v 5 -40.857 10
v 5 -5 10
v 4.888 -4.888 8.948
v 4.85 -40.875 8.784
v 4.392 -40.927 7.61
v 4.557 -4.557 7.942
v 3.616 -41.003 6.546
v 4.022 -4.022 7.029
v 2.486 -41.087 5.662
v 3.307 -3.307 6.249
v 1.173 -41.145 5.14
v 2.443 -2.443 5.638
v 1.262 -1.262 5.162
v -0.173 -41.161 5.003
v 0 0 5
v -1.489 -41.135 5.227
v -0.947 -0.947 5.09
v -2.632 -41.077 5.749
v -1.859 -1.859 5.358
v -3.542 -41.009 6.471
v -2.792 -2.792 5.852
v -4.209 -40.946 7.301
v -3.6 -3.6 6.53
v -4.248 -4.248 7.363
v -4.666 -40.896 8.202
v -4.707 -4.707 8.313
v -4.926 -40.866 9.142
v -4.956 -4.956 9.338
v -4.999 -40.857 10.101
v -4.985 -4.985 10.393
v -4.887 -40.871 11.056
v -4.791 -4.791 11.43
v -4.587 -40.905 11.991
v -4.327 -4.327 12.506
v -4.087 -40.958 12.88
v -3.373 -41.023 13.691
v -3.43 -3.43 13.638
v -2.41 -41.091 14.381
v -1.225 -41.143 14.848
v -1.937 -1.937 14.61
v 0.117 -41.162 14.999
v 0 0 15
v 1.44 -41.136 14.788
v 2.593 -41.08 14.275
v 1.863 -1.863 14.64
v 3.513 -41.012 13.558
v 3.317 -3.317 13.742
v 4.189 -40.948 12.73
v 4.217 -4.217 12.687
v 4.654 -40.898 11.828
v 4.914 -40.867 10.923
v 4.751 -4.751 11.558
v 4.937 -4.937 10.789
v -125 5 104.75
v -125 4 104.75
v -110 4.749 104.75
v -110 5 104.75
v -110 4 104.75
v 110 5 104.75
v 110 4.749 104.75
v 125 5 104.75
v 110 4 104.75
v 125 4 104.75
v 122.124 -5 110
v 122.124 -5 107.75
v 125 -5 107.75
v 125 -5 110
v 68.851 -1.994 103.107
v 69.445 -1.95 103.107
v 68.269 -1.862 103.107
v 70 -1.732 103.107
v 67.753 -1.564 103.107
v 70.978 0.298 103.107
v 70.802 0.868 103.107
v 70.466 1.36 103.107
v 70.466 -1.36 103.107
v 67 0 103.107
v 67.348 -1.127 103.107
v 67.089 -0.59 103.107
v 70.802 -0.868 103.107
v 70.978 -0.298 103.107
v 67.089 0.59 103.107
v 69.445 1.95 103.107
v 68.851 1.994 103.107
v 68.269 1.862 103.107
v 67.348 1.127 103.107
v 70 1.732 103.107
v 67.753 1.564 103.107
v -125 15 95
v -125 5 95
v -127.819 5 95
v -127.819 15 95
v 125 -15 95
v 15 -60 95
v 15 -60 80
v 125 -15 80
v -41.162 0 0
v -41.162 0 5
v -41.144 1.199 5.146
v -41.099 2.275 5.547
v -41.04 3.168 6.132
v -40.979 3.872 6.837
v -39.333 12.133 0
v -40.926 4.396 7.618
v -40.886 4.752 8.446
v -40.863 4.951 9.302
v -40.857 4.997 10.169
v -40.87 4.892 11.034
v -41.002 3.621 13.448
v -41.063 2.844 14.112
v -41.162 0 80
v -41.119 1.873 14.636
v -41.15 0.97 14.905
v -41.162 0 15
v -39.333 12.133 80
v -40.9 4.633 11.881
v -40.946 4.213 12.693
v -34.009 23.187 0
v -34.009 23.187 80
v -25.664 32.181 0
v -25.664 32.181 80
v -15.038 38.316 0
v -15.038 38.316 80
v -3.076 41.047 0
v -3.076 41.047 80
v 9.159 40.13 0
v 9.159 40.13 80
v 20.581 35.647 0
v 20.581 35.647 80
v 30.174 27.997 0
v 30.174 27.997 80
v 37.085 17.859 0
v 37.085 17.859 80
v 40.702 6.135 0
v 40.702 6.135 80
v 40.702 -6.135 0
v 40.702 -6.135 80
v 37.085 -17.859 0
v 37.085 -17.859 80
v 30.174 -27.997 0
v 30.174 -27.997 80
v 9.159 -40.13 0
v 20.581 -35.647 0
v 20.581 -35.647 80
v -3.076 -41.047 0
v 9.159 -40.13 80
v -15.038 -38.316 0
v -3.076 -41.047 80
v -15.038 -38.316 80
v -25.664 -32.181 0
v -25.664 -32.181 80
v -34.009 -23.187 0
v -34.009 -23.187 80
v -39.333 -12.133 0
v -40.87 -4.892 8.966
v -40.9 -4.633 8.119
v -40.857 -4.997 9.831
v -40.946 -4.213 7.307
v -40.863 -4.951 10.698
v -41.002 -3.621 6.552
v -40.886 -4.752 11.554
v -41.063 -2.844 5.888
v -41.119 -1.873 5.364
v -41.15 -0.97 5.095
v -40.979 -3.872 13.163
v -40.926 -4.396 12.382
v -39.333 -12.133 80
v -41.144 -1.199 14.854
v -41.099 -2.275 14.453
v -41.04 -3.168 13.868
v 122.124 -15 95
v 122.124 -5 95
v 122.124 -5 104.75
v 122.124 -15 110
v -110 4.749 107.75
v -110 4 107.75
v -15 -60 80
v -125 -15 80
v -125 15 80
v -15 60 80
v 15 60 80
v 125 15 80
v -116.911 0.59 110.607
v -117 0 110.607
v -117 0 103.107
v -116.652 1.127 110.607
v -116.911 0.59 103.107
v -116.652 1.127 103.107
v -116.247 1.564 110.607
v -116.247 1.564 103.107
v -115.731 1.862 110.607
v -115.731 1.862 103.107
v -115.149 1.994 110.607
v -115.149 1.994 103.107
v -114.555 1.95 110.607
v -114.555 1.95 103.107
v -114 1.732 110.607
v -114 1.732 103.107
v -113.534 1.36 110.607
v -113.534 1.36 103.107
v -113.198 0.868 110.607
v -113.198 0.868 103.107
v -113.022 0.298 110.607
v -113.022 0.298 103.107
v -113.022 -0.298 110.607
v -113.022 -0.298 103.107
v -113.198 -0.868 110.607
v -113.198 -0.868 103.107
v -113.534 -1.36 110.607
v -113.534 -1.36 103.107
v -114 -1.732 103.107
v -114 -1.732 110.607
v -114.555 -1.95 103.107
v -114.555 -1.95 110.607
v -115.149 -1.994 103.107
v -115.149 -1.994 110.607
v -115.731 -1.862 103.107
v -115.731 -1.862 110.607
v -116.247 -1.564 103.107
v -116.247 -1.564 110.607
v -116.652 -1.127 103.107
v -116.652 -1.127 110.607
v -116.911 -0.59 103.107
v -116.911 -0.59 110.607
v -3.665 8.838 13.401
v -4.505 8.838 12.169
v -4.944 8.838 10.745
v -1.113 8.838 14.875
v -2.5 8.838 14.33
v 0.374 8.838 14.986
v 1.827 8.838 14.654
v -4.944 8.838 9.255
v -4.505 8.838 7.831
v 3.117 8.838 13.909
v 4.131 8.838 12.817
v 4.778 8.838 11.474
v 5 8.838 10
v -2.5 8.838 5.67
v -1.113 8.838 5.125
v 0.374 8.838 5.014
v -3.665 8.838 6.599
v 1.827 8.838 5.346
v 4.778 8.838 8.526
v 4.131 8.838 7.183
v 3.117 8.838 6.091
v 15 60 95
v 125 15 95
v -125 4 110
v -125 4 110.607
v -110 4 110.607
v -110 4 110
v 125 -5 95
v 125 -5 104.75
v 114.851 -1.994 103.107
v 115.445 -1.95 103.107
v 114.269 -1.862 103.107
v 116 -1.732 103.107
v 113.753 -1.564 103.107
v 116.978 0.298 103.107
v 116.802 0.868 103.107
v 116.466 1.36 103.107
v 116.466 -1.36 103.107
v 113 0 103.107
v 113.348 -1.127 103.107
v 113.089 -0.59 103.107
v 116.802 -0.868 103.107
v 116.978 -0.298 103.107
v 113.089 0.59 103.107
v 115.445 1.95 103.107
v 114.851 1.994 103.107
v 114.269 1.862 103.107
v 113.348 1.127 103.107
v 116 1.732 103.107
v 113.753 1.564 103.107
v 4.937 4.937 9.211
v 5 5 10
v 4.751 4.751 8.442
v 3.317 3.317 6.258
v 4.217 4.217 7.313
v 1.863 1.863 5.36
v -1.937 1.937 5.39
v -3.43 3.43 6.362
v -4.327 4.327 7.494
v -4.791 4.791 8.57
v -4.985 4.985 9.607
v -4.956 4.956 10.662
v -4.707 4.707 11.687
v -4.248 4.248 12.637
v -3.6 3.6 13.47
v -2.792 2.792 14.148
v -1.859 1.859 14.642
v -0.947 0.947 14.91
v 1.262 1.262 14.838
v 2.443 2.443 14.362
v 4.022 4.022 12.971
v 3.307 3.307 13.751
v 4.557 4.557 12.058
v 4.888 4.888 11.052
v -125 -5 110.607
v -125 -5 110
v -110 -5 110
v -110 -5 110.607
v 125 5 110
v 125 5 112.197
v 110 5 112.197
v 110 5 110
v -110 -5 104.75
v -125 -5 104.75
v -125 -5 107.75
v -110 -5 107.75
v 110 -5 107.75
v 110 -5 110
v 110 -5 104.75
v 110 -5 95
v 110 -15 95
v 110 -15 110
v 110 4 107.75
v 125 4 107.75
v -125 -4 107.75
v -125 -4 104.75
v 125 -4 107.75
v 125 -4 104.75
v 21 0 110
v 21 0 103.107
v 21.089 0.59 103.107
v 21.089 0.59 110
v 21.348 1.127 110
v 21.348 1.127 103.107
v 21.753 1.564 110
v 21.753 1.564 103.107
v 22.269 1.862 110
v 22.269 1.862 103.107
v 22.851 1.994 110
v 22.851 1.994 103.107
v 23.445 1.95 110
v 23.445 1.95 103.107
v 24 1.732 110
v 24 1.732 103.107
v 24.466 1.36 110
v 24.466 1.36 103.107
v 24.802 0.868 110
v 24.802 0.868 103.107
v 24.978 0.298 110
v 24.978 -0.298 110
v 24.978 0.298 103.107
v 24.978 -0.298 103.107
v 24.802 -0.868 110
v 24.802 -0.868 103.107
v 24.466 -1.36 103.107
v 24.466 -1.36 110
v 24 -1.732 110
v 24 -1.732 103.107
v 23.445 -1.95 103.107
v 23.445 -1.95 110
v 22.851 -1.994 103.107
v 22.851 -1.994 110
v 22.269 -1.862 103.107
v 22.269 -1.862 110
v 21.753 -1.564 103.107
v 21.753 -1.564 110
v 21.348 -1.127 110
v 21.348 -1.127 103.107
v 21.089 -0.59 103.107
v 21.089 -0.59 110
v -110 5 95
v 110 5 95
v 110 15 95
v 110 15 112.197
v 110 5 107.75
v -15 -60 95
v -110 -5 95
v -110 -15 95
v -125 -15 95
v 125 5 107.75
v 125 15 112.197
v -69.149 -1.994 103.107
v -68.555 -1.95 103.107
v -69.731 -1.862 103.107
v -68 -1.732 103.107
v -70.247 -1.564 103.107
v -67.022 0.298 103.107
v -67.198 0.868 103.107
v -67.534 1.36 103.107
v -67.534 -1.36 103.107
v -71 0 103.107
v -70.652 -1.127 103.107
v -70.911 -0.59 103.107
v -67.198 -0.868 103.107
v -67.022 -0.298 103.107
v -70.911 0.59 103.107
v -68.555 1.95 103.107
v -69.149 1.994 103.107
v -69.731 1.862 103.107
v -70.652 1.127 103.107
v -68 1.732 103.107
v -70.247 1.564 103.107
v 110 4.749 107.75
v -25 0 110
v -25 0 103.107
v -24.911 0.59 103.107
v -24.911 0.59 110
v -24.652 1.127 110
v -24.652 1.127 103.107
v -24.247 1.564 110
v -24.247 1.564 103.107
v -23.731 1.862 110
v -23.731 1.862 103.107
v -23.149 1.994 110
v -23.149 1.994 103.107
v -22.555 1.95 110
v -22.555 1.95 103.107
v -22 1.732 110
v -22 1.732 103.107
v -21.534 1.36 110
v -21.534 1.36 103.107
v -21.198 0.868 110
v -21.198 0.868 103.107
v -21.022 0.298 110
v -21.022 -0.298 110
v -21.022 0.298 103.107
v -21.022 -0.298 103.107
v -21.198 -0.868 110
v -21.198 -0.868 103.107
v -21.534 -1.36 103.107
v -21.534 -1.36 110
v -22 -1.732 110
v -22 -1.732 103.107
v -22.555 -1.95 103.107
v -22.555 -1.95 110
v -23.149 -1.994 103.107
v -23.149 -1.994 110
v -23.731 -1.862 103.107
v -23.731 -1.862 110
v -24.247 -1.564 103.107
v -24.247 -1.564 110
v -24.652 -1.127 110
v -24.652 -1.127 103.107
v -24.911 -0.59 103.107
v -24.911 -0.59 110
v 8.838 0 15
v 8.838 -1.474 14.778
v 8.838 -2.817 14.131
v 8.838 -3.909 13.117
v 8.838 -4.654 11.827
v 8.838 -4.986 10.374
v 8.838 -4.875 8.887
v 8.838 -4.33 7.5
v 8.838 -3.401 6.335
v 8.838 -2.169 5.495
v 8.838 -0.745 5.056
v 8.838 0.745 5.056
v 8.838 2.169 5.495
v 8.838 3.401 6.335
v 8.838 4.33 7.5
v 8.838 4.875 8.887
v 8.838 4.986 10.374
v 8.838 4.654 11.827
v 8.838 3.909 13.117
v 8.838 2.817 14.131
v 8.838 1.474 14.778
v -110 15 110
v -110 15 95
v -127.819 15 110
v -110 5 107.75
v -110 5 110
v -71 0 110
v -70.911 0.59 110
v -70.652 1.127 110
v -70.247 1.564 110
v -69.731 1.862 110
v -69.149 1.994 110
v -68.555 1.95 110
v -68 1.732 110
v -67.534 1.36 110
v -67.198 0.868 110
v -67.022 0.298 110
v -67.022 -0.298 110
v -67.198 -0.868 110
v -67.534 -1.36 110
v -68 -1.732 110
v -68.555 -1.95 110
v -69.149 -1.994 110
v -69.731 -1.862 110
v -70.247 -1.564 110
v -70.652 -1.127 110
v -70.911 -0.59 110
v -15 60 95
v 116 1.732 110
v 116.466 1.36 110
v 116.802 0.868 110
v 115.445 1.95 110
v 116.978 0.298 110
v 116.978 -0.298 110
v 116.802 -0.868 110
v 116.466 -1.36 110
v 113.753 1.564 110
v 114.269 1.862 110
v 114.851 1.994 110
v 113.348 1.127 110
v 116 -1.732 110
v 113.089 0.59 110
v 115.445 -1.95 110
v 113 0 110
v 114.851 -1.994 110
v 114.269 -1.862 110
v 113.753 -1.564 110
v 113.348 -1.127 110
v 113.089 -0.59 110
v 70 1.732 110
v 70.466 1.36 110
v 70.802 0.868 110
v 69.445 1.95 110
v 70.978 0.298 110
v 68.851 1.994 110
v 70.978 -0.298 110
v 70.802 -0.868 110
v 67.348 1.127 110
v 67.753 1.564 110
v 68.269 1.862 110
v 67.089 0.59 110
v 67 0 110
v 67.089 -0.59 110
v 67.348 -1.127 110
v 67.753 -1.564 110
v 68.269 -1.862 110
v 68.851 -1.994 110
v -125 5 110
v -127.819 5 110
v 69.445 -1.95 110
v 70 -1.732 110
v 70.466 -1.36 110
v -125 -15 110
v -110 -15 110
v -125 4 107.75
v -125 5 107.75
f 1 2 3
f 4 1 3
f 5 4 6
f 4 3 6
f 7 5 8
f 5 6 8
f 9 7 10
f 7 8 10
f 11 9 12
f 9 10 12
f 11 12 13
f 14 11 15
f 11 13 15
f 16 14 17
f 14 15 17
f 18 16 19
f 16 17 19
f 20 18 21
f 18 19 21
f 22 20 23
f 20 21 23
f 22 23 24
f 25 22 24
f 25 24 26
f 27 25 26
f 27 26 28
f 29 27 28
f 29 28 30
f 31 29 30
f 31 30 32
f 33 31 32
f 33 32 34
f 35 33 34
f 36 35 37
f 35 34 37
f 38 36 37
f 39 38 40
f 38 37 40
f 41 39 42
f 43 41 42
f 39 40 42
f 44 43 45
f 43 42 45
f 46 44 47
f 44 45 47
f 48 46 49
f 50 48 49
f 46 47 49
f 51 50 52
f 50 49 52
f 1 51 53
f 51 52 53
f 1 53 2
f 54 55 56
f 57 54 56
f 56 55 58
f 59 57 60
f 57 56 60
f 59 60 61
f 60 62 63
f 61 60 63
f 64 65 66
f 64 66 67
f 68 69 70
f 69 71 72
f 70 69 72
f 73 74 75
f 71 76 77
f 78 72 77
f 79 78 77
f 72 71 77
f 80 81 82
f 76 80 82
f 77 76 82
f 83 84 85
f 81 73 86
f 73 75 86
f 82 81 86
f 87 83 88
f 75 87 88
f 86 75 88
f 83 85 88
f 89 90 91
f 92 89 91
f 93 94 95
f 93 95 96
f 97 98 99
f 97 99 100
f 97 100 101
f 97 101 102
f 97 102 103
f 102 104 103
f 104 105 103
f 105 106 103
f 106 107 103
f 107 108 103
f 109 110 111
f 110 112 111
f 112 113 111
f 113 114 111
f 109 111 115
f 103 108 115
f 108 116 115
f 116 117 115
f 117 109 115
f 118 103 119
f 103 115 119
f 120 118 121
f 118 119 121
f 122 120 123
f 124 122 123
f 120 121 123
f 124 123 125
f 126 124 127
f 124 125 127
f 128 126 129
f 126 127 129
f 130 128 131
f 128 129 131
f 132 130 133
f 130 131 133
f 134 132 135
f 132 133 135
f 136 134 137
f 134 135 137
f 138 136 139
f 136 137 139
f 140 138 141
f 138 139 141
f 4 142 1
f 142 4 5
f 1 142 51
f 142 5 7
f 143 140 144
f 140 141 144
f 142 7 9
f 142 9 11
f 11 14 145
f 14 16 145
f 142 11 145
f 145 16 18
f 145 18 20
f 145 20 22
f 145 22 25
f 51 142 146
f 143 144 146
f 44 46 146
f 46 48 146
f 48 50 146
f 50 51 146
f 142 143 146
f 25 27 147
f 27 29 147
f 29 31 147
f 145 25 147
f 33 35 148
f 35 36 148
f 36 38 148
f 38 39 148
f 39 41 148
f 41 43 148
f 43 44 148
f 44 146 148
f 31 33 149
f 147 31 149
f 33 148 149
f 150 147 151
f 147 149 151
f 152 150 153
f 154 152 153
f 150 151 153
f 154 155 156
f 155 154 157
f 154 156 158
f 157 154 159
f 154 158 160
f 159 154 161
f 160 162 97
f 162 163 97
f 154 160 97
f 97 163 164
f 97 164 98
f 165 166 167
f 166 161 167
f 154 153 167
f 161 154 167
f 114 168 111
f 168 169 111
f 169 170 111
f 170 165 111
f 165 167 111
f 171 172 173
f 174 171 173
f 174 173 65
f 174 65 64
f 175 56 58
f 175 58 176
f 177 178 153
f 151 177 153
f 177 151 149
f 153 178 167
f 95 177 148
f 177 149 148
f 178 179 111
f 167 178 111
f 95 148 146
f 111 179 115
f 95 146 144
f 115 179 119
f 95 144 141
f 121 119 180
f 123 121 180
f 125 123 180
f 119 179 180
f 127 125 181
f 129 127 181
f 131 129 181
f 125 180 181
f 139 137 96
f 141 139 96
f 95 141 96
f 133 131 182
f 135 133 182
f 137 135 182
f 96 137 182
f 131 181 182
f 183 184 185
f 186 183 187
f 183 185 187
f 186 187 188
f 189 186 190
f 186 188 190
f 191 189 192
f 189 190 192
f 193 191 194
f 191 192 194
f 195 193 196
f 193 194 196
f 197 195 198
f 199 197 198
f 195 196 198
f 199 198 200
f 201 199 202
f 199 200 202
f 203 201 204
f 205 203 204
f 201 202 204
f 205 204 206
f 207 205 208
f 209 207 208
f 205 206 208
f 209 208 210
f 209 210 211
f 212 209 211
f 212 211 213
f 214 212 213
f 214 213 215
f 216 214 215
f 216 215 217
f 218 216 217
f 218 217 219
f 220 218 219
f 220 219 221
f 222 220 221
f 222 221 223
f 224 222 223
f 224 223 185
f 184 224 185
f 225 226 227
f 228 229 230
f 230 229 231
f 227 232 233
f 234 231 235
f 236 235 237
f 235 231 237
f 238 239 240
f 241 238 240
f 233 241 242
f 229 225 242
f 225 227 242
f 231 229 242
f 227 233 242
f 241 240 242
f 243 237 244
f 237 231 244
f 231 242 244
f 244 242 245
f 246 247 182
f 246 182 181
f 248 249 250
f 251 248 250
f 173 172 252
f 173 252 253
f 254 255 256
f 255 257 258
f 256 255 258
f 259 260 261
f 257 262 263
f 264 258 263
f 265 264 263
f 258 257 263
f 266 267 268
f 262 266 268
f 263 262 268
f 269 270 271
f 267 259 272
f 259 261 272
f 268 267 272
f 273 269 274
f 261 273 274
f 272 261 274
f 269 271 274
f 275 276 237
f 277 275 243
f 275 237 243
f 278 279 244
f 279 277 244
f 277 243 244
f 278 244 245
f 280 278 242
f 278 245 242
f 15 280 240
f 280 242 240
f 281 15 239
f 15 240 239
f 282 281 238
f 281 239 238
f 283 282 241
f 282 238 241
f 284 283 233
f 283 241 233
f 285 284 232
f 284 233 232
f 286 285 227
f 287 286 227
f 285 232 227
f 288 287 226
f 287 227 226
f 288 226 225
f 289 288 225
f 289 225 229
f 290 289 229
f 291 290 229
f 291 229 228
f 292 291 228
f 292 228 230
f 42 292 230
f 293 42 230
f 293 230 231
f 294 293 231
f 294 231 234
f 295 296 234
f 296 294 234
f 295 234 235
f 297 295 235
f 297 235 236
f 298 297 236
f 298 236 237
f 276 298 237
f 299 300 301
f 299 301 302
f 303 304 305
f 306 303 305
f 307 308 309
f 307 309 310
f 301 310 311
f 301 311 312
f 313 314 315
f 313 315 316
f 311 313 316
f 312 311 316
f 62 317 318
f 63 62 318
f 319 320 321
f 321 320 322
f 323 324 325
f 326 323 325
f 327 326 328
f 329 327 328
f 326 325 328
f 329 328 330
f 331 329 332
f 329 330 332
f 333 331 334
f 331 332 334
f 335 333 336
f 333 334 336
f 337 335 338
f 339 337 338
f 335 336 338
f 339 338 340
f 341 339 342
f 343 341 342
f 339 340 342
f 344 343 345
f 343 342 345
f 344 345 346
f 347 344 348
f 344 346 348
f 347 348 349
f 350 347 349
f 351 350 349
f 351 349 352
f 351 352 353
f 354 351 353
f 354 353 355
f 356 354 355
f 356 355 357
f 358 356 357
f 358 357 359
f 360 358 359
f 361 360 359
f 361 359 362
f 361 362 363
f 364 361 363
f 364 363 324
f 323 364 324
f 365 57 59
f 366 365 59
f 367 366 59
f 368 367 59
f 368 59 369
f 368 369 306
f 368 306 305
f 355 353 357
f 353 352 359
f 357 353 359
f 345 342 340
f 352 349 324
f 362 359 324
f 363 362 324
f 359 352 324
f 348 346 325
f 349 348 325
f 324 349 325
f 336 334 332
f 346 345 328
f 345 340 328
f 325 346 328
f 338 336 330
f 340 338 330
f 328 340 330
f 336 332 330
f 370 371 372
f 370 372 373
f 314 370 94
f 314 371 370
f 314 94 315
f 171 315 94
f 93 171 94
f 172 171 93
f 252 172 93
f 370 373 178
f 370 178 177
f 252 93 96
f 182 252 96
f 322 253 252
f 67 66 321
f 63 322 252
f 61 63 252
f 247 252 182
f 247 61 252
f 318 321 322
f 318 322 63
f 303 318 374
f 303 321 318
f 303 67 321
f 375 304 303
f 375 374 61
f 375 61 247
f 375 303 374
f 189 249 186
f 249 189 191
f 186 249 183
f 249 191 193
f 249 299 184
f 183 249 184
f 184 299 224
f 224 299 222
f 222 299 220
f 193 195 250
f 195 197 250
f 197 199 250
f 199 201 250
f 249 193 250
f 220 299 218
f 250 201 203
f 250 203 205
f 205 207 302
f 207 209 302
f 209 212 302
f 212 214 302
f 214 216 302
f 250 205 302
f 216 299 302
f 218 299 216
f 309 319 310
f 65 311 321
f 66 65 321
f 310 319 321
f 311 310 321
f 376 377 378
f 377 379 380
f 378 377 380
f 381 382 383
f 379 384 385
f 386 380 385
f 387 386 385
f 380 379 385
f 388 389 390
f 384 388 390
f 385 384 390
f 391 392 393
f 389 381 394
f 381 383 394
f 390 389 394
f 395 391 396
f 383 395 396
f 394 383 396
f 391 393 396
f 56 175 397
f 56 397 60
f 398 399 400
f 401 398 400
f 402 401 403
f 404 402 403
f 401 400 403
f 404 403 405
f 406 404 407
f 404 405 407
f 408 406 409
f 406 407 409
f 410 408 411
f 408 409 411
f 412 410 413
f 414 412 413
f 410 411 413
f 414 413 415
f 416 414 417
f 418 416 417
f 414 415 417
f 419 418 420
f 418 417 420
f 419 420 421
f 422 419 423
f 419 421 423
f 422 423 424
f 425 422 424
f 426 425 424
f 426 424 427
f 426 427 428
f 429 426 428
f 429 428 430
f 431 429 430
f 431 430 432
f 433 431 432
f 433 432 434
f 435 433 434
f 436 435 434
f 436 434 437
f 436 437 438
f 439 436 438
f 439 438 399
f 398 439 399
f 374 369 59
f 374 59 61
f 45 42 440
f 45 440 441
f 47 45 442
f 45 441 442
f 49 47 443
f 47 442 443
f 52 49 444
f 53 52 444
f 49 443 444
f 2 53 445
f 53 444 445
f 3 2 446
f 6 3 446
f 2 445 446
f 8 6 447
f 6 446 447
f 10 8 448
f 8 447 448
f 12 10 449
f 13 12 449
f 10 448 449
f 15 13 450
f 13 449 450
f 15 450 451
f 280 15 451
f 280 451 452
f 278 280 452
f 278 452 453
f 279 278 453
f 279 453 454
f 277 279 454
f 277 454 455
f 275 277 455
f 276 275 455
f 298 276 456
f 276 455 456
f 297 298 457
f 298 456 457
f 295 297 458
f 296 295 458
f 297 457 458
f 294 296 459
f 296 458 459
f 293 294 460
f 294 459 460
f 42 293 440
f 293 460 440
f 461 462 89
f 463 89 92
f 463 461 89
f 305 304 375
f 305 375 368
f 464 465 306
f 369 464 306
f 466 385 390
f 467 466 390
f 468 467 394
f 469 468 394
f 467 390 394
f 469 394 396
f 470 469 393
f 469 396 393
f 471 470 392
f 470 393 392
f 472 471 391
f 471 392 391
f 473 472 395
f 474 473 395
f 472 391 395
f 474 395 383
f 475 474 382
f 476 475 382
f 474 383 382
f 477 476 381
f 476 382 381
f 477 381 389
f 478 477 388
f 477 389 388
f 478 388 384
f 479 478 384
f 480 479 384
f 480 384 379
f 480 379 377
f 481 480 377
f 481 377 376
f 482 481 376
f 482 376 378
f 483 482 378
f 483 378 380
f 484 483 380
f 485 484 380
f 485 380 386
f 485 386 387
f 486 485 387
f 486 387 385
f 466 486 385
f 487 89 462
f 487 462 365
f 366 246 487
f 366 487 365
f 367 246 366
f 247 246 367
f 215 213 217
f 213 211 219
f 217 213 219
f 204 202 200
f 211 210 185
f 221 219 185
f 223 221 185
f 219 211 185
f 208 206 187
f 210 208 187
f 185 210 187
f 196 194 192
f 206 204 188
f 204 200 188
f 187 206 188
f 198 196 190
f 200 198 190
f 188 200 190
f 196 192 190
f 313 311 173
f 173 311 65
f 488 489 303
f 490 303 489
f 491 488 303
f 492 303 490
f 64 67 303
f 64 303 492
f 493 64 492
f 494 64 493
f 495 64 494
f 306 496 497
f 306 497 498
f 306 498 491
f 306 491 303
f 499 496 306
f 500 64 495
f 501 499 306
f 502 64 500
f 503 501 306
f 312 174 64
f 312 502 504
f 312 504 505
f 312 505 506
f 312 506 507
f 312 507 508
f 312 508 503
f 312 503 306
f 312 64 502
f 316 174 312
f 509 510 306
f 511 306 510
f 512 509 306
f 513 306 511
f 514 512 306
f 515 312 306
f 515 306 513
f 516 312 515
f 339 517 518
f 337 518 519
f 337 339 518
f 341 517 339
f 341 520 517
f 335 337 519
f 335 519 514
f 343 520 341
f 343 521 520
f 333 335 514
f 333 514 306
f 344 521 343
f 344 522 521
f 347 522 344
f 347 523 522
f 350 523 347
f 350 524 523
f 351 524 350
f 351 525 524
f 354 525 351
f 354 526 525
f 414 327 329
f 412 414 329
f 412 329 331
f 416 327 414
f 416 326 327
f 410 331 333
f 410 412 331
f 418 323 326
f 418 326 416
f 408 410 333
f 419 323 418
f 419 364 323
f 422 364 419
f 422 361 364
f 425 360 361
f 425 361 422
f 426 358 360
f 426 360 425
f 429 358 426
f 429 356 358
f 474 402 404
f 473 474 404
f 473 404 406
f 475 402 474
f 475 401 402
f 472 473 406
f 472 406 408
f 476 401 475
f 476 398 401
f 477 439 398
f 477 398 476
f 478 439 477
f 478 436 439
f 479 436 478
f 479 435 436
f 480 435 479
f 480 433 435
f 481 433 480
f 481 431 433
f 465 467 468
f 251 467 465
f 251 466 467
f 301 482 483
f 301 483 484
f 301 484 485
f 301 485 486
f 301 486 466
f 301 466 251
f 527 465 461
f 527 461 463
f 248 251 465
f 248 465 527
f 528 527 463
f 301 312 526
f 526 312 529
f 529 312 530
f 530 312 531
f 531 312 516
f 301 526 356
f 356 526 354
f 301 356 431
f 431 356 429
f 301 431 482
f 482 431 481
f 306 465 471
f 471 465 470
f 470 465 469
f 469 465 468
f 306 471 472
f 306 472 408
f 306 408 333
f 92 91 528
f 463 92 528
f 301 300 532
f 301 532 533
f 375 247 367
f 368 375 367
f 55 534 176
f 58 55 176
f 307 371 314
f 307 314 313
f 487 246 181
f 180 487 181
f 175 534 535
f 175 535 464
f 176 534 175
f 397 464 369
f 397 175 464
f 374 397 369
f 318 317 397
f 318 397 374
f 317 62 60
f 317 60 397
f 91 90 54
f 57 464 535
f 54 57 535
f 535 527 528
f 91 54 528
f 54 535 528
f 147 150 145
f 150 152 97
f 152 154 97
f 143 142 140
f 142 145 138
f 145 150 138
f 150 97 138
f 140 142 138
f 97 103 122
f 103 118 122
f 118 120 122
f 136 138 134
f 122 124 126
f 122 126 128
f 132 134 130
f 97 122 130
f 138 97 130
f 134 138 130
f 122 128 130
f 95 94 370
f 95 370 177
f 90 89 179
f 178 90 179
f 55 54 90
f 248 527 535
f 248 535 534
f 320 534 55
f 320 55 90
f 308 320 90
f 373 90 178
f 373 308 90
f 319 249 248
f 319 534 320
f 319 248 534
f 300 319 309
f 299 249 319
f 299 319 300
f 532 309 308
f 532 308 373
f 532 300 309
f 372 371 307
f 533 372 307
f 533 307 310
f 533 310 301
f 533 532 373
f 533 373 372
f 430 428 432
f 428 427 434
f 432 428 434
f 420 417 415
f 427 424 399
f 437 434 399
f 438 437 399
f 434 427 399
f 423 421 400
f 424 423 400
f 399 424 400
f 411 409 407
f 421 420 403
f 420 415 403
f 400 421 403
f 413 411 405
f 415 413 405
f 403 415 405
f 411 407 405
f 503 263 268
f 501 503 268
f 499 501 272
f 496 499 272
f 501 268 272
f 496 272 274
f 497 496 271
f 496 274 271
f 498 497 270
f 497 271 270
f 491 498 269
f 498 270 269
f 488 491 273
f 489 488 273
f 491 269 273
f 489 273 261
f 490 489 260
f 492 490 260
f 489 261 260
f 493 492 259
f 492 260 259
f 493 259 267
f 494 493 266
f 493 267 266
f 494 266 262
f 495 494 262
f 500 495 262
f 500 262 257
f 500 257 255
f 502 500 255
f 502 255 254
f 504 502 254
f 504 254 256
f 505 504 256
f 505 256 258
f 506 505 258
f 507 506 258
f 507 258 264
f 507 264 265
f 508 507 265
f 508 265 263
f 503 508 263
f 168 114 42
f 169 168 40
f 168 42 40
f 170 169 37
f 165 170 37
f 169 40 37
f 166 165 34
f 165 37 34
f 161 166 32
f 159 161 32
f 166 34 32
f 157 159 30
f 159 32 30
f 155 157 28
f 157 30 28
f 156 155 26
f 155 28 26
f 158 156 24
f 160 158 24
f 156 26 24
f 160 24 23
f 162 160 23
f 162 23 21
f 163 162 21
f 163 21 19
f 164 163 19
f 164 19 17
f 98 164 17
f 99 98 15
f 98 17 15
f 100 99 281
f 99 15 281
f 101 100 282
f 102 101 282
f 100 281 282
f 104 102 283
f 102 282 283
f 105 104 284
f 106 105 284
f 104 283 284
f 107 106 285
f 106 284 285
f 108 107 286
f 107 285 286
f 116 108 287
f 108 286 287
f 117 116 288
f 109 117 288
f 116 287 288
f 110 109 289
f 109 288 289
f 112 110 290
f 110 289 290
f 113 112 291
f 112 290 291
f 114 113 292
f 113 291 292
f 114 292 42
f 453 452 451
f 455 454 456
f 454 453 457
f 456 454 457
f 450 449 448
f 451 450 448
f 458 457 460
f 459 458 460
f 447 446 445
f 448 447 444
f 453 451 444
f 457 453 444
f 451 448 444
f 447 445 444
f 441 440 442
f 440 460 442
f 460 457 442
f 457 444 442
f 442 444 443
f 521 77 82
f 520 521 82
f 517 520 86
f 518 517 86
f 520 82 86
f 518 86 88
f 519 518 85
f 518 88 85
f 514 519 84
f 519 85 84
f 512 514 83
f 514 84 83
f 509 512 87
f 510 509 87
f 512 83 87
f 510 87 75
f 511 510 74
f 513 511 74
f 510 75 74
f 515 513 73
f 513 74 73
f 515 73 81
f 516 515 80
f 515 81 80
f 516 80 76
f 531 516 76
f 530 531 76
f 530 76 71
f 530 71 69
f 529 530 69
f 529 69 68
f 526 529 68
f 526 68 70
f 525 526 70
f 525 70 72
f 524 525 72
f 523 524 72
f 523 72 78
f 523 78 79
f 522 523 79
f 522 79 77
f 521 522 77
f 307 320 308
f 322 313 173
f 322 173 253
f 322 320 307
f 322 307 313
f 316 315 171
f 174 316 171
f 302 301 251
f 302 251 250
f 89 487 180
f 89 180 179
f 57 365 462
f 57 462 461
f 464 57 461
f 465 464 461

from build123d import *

# Parameters (mm, degrees)
SKETCH_1_W                  = 15
SKETCH_1_H                  = 15.60669
EXTRUDE_1_DEPTH             = 9
EXTRUDE_2_DEPTH             = 235
EXTRUDE_3_DEPTH             = 1
SKETCH_4_W                  = 15
SKETCH_4_H                  = 17.19706
EXTRUDE_4_DEPTH             = 10
SKETCH_5_W                  = 15
SKETCH_5_H                  = 3
CUT_EXTRUDE_1_DEPTH         = 1
SKETCH_6_W                  = 12.12351
SKETCH_6_H                  = 15
EXTRUDE_5_DEPTH             = 10
SKETCH_7_W                  = 15
SKETCH_7_H                  = 15
EXTRUDE_6_DEPTH             = 10
SKETCH_8_W                  = 15
SKETCH_8_H                  = 3
CUT_EXTRUDE_2_DEPTH         = 1
SKETCH_9_W                  = 17.81946
SKETCH_9_H                  = 15
EXTRUDE_7_DEPTH             = 10
EXTRUDE_8_DEPTH             = 15
SKETCH_11_W                 = 41.16167
SKETCH_11_H                 = 80
HOLE_WIZARD_10_0_10_1_D     = 10
HOLE_WIZARD_10_0_10_1_DEPTH = 50
HOLE_WIZARD_10_0_10_2_D     = 10
HOLE_WIZARD_10_0_10_2_DEPTH = 50
HOLE_WIZARD_4_0_4_1_D       = 4
HOLE_WIZARD_4_0_4_1_DEPTH   = 7.5
CHAMFER_1_SIZE              = 16.206633169
CHAMFER_1_EDGE_2_SIZE       = 16.206633169


with BuildPart() as part:
    # 草图1 → 凸台-拉伸1 (new body)
    with BuildSketch(Plane.XZ.offset(5)):
        with Locations((-117.5, 102.803345)):
            Rectangle(SKETCH_1_W, SKETCH_1_H)
    extrude(amount=-EXTRUDE_1_DEPTH)

    # 草图2 → 凸台-拉伸2 (add)
    with BuildSketch(Plane(origin=(-110, 0, 0), x_dir=(0, 0, -1), z_dir=(1, 0, 0))):
        Polygon((-95, 4.74906), (-95, -5), (-104.75, -5), (-104.75, -4), (-107.75, -4), (-107.75, -5), (-110, -5), (-110, 4.74906), align=None)
    extrude(amount=EXTRUDE_2_DEPTH)

    # 草图3 → 凸台-拉伸3 (add)
    with BuildSketch(Plane(origin=(0, 4, 0), x_dir=(-1, 0, 0), z_dir=(0, 1, 0))):
        Polygon((125, 95), (-125, 95), (-125, 110), (125, 110), (125, 107.75), (-110, 107.75), (-110, 104.75), (125, 104.75), align=None)
    extrude(amount=EXTRUDE_3_DEPTH)

    # 草图4 → 凸台-拉伸4 (add)
    with BuildSketch(Plane(origin=(0, 5, 0), x_dir=(-1, 0, 0), z_dir=(0, 1, 0))):
        with Locations((-117.5, 103.59853)):
            Rectangle(SKETCH_4_W, SKETCH_4_H)
    extrude(amount=EXTRUDE_4_DEPTH)

    # 草图5 → 切除-拉伸1 (cut)
    with BuildSketch(Plane.XZ.offset(-4)):
        with Locations((117.5, 106.25)):
            Rectangle(SKETCH_5_W, SKETCH_5_H)
    extrude(amount=-CUT_EXTRUDE_1_DEPTH, mode=Mode.SUBTRACT)

    # 草图6 → 凸台-拉伸5 (add)
    with BuildSketch(Plane.XZ.offset(5)):
        with Locations((116.061755, 102.5)):
            Rectangle(SKETCH_6_W, SKETCH_6_H)
    extrude(amount=EXTRUDE_5_DEPTH)

    # 草图7 → 凸台-拉伸6 (add)
    with BuildSketch(Plane.XZ.offset(5)):
        with Locations((-117.5, 102.5)):
            Rectangle(SKETCH_7_W, SKETCH_7_H)
    extrude(amount=EXTRUDE_6_DEPTH)

    # 草图8 → 切除-拉伸2 (cut)
    with BuildSketch(Plane(origin=(0, -4, 0), x_dir=(1, 0, 0), z_dir=(0, 1, 0))):
        with Locations((-117.5, -106.25)):
            Rectangle(SKETCH_8_W, SKETCH_8_H)
    extrude(amount=-CUT_EXTRUDE_2_DEPTH, mode=Mode.SUBTRACT)

    # 草图9 → 凸台-拉伸7 (add)
    with BuildSketch(Plane(origin=(0, 5, 0), x_dir=(-1, 0, 0), z_dir=(0, 1, 0))):
        with Locations((118.90973, 102.5)):
            Rectangle(SKETCH_9_W, SKETCH_9_H)
    extrude(amount=EXTRUDE_7_DEPTH)

    # 草图10 → 凸台-拉伸8 (add)
    with BuildSketch(Plane(origin=(0, 0, 95), x_dir=(-1, 0, 0), z_dir=(0, 0, -1))):
        Polygon((0, 66.136363636), (125, 15), (125, -15), (0, -66.136363636), (-125, -15), (-125, 15), align=None)
    extrude(amount=EXTRUDE_8_DEPTH)

    # 草图11 → 旋转1 (revolve)
    with BuildSketch(Plane.XZ, mode=Mode.PRIVATE) as revolve_1_sk:
        with Locations((20.580835, 40)):
            Rectangle(SKETCH_11_W, SKETCH_11_H)
    revolve(revolve_1_sk.sketch.rotate(Axis((0, 0, 80), (0, 0, -1)), 180), axis=Axis((0, 0, 80), (0, 0, -1)))

    # Ø10.0 (10) 直径孔1
    with Locations(Plane(origin=(-41.16167, 0, 10), x_dir=(0, 0, -1), z_dir=(-1, 0, 0))):
        with Locations((0, 0)):
            Hole(HOLE_WIZARD_10_0_10_1_D / 2, depth=HOLE_WIZARD_10_0_10_1_DEPTH)

    # Ø10.0 (10) 直径孔2
    with Locations(Plane(origin=(0, -41.16167, 10), x_dir=(-1, 0, 0), z_dir=(0, -1, 0))):
        with Locations((0, 0)):
            Hole(HOLE_WIZARD_10_0_10_2_D / 2, depth=HOLE_WIZARD_10_0_10_2_DEPTH)

    # Ø4.0 (4) 直径孔1
    with Locations(Plane.XY.offset(110.60669)):
        with Locations((115, 0), (69, 0), (23, 0), (-23, 0), (-69, 0), (-115, 0)):
            Hole(HOLE_WIZARD_4_0_4_1_D / 2, depth=HOLE_WIZARD_4_0_4_1_DEPTH)

    # 倒角1
    chamfer_1_edges = [part.edges().sort_by_distance(p)[0] for p in [
        (0, 66.136363636, 87.5),
    ]]
    chamfer(chamfer_1_edges, length=CHAMFER_1_SIZE)

    # 倒角1 edge 2
    chamfer_1_edge_2_edges = [part.edges().sort_by_distance(p)[0] for p in [
        (0, -66.136363636, 87.5),
    ]]
    chamfer(chamfer_1_edge_2_edges, length=CHAMFER_1_EDGE_2_SIZE)


solid = part.part
